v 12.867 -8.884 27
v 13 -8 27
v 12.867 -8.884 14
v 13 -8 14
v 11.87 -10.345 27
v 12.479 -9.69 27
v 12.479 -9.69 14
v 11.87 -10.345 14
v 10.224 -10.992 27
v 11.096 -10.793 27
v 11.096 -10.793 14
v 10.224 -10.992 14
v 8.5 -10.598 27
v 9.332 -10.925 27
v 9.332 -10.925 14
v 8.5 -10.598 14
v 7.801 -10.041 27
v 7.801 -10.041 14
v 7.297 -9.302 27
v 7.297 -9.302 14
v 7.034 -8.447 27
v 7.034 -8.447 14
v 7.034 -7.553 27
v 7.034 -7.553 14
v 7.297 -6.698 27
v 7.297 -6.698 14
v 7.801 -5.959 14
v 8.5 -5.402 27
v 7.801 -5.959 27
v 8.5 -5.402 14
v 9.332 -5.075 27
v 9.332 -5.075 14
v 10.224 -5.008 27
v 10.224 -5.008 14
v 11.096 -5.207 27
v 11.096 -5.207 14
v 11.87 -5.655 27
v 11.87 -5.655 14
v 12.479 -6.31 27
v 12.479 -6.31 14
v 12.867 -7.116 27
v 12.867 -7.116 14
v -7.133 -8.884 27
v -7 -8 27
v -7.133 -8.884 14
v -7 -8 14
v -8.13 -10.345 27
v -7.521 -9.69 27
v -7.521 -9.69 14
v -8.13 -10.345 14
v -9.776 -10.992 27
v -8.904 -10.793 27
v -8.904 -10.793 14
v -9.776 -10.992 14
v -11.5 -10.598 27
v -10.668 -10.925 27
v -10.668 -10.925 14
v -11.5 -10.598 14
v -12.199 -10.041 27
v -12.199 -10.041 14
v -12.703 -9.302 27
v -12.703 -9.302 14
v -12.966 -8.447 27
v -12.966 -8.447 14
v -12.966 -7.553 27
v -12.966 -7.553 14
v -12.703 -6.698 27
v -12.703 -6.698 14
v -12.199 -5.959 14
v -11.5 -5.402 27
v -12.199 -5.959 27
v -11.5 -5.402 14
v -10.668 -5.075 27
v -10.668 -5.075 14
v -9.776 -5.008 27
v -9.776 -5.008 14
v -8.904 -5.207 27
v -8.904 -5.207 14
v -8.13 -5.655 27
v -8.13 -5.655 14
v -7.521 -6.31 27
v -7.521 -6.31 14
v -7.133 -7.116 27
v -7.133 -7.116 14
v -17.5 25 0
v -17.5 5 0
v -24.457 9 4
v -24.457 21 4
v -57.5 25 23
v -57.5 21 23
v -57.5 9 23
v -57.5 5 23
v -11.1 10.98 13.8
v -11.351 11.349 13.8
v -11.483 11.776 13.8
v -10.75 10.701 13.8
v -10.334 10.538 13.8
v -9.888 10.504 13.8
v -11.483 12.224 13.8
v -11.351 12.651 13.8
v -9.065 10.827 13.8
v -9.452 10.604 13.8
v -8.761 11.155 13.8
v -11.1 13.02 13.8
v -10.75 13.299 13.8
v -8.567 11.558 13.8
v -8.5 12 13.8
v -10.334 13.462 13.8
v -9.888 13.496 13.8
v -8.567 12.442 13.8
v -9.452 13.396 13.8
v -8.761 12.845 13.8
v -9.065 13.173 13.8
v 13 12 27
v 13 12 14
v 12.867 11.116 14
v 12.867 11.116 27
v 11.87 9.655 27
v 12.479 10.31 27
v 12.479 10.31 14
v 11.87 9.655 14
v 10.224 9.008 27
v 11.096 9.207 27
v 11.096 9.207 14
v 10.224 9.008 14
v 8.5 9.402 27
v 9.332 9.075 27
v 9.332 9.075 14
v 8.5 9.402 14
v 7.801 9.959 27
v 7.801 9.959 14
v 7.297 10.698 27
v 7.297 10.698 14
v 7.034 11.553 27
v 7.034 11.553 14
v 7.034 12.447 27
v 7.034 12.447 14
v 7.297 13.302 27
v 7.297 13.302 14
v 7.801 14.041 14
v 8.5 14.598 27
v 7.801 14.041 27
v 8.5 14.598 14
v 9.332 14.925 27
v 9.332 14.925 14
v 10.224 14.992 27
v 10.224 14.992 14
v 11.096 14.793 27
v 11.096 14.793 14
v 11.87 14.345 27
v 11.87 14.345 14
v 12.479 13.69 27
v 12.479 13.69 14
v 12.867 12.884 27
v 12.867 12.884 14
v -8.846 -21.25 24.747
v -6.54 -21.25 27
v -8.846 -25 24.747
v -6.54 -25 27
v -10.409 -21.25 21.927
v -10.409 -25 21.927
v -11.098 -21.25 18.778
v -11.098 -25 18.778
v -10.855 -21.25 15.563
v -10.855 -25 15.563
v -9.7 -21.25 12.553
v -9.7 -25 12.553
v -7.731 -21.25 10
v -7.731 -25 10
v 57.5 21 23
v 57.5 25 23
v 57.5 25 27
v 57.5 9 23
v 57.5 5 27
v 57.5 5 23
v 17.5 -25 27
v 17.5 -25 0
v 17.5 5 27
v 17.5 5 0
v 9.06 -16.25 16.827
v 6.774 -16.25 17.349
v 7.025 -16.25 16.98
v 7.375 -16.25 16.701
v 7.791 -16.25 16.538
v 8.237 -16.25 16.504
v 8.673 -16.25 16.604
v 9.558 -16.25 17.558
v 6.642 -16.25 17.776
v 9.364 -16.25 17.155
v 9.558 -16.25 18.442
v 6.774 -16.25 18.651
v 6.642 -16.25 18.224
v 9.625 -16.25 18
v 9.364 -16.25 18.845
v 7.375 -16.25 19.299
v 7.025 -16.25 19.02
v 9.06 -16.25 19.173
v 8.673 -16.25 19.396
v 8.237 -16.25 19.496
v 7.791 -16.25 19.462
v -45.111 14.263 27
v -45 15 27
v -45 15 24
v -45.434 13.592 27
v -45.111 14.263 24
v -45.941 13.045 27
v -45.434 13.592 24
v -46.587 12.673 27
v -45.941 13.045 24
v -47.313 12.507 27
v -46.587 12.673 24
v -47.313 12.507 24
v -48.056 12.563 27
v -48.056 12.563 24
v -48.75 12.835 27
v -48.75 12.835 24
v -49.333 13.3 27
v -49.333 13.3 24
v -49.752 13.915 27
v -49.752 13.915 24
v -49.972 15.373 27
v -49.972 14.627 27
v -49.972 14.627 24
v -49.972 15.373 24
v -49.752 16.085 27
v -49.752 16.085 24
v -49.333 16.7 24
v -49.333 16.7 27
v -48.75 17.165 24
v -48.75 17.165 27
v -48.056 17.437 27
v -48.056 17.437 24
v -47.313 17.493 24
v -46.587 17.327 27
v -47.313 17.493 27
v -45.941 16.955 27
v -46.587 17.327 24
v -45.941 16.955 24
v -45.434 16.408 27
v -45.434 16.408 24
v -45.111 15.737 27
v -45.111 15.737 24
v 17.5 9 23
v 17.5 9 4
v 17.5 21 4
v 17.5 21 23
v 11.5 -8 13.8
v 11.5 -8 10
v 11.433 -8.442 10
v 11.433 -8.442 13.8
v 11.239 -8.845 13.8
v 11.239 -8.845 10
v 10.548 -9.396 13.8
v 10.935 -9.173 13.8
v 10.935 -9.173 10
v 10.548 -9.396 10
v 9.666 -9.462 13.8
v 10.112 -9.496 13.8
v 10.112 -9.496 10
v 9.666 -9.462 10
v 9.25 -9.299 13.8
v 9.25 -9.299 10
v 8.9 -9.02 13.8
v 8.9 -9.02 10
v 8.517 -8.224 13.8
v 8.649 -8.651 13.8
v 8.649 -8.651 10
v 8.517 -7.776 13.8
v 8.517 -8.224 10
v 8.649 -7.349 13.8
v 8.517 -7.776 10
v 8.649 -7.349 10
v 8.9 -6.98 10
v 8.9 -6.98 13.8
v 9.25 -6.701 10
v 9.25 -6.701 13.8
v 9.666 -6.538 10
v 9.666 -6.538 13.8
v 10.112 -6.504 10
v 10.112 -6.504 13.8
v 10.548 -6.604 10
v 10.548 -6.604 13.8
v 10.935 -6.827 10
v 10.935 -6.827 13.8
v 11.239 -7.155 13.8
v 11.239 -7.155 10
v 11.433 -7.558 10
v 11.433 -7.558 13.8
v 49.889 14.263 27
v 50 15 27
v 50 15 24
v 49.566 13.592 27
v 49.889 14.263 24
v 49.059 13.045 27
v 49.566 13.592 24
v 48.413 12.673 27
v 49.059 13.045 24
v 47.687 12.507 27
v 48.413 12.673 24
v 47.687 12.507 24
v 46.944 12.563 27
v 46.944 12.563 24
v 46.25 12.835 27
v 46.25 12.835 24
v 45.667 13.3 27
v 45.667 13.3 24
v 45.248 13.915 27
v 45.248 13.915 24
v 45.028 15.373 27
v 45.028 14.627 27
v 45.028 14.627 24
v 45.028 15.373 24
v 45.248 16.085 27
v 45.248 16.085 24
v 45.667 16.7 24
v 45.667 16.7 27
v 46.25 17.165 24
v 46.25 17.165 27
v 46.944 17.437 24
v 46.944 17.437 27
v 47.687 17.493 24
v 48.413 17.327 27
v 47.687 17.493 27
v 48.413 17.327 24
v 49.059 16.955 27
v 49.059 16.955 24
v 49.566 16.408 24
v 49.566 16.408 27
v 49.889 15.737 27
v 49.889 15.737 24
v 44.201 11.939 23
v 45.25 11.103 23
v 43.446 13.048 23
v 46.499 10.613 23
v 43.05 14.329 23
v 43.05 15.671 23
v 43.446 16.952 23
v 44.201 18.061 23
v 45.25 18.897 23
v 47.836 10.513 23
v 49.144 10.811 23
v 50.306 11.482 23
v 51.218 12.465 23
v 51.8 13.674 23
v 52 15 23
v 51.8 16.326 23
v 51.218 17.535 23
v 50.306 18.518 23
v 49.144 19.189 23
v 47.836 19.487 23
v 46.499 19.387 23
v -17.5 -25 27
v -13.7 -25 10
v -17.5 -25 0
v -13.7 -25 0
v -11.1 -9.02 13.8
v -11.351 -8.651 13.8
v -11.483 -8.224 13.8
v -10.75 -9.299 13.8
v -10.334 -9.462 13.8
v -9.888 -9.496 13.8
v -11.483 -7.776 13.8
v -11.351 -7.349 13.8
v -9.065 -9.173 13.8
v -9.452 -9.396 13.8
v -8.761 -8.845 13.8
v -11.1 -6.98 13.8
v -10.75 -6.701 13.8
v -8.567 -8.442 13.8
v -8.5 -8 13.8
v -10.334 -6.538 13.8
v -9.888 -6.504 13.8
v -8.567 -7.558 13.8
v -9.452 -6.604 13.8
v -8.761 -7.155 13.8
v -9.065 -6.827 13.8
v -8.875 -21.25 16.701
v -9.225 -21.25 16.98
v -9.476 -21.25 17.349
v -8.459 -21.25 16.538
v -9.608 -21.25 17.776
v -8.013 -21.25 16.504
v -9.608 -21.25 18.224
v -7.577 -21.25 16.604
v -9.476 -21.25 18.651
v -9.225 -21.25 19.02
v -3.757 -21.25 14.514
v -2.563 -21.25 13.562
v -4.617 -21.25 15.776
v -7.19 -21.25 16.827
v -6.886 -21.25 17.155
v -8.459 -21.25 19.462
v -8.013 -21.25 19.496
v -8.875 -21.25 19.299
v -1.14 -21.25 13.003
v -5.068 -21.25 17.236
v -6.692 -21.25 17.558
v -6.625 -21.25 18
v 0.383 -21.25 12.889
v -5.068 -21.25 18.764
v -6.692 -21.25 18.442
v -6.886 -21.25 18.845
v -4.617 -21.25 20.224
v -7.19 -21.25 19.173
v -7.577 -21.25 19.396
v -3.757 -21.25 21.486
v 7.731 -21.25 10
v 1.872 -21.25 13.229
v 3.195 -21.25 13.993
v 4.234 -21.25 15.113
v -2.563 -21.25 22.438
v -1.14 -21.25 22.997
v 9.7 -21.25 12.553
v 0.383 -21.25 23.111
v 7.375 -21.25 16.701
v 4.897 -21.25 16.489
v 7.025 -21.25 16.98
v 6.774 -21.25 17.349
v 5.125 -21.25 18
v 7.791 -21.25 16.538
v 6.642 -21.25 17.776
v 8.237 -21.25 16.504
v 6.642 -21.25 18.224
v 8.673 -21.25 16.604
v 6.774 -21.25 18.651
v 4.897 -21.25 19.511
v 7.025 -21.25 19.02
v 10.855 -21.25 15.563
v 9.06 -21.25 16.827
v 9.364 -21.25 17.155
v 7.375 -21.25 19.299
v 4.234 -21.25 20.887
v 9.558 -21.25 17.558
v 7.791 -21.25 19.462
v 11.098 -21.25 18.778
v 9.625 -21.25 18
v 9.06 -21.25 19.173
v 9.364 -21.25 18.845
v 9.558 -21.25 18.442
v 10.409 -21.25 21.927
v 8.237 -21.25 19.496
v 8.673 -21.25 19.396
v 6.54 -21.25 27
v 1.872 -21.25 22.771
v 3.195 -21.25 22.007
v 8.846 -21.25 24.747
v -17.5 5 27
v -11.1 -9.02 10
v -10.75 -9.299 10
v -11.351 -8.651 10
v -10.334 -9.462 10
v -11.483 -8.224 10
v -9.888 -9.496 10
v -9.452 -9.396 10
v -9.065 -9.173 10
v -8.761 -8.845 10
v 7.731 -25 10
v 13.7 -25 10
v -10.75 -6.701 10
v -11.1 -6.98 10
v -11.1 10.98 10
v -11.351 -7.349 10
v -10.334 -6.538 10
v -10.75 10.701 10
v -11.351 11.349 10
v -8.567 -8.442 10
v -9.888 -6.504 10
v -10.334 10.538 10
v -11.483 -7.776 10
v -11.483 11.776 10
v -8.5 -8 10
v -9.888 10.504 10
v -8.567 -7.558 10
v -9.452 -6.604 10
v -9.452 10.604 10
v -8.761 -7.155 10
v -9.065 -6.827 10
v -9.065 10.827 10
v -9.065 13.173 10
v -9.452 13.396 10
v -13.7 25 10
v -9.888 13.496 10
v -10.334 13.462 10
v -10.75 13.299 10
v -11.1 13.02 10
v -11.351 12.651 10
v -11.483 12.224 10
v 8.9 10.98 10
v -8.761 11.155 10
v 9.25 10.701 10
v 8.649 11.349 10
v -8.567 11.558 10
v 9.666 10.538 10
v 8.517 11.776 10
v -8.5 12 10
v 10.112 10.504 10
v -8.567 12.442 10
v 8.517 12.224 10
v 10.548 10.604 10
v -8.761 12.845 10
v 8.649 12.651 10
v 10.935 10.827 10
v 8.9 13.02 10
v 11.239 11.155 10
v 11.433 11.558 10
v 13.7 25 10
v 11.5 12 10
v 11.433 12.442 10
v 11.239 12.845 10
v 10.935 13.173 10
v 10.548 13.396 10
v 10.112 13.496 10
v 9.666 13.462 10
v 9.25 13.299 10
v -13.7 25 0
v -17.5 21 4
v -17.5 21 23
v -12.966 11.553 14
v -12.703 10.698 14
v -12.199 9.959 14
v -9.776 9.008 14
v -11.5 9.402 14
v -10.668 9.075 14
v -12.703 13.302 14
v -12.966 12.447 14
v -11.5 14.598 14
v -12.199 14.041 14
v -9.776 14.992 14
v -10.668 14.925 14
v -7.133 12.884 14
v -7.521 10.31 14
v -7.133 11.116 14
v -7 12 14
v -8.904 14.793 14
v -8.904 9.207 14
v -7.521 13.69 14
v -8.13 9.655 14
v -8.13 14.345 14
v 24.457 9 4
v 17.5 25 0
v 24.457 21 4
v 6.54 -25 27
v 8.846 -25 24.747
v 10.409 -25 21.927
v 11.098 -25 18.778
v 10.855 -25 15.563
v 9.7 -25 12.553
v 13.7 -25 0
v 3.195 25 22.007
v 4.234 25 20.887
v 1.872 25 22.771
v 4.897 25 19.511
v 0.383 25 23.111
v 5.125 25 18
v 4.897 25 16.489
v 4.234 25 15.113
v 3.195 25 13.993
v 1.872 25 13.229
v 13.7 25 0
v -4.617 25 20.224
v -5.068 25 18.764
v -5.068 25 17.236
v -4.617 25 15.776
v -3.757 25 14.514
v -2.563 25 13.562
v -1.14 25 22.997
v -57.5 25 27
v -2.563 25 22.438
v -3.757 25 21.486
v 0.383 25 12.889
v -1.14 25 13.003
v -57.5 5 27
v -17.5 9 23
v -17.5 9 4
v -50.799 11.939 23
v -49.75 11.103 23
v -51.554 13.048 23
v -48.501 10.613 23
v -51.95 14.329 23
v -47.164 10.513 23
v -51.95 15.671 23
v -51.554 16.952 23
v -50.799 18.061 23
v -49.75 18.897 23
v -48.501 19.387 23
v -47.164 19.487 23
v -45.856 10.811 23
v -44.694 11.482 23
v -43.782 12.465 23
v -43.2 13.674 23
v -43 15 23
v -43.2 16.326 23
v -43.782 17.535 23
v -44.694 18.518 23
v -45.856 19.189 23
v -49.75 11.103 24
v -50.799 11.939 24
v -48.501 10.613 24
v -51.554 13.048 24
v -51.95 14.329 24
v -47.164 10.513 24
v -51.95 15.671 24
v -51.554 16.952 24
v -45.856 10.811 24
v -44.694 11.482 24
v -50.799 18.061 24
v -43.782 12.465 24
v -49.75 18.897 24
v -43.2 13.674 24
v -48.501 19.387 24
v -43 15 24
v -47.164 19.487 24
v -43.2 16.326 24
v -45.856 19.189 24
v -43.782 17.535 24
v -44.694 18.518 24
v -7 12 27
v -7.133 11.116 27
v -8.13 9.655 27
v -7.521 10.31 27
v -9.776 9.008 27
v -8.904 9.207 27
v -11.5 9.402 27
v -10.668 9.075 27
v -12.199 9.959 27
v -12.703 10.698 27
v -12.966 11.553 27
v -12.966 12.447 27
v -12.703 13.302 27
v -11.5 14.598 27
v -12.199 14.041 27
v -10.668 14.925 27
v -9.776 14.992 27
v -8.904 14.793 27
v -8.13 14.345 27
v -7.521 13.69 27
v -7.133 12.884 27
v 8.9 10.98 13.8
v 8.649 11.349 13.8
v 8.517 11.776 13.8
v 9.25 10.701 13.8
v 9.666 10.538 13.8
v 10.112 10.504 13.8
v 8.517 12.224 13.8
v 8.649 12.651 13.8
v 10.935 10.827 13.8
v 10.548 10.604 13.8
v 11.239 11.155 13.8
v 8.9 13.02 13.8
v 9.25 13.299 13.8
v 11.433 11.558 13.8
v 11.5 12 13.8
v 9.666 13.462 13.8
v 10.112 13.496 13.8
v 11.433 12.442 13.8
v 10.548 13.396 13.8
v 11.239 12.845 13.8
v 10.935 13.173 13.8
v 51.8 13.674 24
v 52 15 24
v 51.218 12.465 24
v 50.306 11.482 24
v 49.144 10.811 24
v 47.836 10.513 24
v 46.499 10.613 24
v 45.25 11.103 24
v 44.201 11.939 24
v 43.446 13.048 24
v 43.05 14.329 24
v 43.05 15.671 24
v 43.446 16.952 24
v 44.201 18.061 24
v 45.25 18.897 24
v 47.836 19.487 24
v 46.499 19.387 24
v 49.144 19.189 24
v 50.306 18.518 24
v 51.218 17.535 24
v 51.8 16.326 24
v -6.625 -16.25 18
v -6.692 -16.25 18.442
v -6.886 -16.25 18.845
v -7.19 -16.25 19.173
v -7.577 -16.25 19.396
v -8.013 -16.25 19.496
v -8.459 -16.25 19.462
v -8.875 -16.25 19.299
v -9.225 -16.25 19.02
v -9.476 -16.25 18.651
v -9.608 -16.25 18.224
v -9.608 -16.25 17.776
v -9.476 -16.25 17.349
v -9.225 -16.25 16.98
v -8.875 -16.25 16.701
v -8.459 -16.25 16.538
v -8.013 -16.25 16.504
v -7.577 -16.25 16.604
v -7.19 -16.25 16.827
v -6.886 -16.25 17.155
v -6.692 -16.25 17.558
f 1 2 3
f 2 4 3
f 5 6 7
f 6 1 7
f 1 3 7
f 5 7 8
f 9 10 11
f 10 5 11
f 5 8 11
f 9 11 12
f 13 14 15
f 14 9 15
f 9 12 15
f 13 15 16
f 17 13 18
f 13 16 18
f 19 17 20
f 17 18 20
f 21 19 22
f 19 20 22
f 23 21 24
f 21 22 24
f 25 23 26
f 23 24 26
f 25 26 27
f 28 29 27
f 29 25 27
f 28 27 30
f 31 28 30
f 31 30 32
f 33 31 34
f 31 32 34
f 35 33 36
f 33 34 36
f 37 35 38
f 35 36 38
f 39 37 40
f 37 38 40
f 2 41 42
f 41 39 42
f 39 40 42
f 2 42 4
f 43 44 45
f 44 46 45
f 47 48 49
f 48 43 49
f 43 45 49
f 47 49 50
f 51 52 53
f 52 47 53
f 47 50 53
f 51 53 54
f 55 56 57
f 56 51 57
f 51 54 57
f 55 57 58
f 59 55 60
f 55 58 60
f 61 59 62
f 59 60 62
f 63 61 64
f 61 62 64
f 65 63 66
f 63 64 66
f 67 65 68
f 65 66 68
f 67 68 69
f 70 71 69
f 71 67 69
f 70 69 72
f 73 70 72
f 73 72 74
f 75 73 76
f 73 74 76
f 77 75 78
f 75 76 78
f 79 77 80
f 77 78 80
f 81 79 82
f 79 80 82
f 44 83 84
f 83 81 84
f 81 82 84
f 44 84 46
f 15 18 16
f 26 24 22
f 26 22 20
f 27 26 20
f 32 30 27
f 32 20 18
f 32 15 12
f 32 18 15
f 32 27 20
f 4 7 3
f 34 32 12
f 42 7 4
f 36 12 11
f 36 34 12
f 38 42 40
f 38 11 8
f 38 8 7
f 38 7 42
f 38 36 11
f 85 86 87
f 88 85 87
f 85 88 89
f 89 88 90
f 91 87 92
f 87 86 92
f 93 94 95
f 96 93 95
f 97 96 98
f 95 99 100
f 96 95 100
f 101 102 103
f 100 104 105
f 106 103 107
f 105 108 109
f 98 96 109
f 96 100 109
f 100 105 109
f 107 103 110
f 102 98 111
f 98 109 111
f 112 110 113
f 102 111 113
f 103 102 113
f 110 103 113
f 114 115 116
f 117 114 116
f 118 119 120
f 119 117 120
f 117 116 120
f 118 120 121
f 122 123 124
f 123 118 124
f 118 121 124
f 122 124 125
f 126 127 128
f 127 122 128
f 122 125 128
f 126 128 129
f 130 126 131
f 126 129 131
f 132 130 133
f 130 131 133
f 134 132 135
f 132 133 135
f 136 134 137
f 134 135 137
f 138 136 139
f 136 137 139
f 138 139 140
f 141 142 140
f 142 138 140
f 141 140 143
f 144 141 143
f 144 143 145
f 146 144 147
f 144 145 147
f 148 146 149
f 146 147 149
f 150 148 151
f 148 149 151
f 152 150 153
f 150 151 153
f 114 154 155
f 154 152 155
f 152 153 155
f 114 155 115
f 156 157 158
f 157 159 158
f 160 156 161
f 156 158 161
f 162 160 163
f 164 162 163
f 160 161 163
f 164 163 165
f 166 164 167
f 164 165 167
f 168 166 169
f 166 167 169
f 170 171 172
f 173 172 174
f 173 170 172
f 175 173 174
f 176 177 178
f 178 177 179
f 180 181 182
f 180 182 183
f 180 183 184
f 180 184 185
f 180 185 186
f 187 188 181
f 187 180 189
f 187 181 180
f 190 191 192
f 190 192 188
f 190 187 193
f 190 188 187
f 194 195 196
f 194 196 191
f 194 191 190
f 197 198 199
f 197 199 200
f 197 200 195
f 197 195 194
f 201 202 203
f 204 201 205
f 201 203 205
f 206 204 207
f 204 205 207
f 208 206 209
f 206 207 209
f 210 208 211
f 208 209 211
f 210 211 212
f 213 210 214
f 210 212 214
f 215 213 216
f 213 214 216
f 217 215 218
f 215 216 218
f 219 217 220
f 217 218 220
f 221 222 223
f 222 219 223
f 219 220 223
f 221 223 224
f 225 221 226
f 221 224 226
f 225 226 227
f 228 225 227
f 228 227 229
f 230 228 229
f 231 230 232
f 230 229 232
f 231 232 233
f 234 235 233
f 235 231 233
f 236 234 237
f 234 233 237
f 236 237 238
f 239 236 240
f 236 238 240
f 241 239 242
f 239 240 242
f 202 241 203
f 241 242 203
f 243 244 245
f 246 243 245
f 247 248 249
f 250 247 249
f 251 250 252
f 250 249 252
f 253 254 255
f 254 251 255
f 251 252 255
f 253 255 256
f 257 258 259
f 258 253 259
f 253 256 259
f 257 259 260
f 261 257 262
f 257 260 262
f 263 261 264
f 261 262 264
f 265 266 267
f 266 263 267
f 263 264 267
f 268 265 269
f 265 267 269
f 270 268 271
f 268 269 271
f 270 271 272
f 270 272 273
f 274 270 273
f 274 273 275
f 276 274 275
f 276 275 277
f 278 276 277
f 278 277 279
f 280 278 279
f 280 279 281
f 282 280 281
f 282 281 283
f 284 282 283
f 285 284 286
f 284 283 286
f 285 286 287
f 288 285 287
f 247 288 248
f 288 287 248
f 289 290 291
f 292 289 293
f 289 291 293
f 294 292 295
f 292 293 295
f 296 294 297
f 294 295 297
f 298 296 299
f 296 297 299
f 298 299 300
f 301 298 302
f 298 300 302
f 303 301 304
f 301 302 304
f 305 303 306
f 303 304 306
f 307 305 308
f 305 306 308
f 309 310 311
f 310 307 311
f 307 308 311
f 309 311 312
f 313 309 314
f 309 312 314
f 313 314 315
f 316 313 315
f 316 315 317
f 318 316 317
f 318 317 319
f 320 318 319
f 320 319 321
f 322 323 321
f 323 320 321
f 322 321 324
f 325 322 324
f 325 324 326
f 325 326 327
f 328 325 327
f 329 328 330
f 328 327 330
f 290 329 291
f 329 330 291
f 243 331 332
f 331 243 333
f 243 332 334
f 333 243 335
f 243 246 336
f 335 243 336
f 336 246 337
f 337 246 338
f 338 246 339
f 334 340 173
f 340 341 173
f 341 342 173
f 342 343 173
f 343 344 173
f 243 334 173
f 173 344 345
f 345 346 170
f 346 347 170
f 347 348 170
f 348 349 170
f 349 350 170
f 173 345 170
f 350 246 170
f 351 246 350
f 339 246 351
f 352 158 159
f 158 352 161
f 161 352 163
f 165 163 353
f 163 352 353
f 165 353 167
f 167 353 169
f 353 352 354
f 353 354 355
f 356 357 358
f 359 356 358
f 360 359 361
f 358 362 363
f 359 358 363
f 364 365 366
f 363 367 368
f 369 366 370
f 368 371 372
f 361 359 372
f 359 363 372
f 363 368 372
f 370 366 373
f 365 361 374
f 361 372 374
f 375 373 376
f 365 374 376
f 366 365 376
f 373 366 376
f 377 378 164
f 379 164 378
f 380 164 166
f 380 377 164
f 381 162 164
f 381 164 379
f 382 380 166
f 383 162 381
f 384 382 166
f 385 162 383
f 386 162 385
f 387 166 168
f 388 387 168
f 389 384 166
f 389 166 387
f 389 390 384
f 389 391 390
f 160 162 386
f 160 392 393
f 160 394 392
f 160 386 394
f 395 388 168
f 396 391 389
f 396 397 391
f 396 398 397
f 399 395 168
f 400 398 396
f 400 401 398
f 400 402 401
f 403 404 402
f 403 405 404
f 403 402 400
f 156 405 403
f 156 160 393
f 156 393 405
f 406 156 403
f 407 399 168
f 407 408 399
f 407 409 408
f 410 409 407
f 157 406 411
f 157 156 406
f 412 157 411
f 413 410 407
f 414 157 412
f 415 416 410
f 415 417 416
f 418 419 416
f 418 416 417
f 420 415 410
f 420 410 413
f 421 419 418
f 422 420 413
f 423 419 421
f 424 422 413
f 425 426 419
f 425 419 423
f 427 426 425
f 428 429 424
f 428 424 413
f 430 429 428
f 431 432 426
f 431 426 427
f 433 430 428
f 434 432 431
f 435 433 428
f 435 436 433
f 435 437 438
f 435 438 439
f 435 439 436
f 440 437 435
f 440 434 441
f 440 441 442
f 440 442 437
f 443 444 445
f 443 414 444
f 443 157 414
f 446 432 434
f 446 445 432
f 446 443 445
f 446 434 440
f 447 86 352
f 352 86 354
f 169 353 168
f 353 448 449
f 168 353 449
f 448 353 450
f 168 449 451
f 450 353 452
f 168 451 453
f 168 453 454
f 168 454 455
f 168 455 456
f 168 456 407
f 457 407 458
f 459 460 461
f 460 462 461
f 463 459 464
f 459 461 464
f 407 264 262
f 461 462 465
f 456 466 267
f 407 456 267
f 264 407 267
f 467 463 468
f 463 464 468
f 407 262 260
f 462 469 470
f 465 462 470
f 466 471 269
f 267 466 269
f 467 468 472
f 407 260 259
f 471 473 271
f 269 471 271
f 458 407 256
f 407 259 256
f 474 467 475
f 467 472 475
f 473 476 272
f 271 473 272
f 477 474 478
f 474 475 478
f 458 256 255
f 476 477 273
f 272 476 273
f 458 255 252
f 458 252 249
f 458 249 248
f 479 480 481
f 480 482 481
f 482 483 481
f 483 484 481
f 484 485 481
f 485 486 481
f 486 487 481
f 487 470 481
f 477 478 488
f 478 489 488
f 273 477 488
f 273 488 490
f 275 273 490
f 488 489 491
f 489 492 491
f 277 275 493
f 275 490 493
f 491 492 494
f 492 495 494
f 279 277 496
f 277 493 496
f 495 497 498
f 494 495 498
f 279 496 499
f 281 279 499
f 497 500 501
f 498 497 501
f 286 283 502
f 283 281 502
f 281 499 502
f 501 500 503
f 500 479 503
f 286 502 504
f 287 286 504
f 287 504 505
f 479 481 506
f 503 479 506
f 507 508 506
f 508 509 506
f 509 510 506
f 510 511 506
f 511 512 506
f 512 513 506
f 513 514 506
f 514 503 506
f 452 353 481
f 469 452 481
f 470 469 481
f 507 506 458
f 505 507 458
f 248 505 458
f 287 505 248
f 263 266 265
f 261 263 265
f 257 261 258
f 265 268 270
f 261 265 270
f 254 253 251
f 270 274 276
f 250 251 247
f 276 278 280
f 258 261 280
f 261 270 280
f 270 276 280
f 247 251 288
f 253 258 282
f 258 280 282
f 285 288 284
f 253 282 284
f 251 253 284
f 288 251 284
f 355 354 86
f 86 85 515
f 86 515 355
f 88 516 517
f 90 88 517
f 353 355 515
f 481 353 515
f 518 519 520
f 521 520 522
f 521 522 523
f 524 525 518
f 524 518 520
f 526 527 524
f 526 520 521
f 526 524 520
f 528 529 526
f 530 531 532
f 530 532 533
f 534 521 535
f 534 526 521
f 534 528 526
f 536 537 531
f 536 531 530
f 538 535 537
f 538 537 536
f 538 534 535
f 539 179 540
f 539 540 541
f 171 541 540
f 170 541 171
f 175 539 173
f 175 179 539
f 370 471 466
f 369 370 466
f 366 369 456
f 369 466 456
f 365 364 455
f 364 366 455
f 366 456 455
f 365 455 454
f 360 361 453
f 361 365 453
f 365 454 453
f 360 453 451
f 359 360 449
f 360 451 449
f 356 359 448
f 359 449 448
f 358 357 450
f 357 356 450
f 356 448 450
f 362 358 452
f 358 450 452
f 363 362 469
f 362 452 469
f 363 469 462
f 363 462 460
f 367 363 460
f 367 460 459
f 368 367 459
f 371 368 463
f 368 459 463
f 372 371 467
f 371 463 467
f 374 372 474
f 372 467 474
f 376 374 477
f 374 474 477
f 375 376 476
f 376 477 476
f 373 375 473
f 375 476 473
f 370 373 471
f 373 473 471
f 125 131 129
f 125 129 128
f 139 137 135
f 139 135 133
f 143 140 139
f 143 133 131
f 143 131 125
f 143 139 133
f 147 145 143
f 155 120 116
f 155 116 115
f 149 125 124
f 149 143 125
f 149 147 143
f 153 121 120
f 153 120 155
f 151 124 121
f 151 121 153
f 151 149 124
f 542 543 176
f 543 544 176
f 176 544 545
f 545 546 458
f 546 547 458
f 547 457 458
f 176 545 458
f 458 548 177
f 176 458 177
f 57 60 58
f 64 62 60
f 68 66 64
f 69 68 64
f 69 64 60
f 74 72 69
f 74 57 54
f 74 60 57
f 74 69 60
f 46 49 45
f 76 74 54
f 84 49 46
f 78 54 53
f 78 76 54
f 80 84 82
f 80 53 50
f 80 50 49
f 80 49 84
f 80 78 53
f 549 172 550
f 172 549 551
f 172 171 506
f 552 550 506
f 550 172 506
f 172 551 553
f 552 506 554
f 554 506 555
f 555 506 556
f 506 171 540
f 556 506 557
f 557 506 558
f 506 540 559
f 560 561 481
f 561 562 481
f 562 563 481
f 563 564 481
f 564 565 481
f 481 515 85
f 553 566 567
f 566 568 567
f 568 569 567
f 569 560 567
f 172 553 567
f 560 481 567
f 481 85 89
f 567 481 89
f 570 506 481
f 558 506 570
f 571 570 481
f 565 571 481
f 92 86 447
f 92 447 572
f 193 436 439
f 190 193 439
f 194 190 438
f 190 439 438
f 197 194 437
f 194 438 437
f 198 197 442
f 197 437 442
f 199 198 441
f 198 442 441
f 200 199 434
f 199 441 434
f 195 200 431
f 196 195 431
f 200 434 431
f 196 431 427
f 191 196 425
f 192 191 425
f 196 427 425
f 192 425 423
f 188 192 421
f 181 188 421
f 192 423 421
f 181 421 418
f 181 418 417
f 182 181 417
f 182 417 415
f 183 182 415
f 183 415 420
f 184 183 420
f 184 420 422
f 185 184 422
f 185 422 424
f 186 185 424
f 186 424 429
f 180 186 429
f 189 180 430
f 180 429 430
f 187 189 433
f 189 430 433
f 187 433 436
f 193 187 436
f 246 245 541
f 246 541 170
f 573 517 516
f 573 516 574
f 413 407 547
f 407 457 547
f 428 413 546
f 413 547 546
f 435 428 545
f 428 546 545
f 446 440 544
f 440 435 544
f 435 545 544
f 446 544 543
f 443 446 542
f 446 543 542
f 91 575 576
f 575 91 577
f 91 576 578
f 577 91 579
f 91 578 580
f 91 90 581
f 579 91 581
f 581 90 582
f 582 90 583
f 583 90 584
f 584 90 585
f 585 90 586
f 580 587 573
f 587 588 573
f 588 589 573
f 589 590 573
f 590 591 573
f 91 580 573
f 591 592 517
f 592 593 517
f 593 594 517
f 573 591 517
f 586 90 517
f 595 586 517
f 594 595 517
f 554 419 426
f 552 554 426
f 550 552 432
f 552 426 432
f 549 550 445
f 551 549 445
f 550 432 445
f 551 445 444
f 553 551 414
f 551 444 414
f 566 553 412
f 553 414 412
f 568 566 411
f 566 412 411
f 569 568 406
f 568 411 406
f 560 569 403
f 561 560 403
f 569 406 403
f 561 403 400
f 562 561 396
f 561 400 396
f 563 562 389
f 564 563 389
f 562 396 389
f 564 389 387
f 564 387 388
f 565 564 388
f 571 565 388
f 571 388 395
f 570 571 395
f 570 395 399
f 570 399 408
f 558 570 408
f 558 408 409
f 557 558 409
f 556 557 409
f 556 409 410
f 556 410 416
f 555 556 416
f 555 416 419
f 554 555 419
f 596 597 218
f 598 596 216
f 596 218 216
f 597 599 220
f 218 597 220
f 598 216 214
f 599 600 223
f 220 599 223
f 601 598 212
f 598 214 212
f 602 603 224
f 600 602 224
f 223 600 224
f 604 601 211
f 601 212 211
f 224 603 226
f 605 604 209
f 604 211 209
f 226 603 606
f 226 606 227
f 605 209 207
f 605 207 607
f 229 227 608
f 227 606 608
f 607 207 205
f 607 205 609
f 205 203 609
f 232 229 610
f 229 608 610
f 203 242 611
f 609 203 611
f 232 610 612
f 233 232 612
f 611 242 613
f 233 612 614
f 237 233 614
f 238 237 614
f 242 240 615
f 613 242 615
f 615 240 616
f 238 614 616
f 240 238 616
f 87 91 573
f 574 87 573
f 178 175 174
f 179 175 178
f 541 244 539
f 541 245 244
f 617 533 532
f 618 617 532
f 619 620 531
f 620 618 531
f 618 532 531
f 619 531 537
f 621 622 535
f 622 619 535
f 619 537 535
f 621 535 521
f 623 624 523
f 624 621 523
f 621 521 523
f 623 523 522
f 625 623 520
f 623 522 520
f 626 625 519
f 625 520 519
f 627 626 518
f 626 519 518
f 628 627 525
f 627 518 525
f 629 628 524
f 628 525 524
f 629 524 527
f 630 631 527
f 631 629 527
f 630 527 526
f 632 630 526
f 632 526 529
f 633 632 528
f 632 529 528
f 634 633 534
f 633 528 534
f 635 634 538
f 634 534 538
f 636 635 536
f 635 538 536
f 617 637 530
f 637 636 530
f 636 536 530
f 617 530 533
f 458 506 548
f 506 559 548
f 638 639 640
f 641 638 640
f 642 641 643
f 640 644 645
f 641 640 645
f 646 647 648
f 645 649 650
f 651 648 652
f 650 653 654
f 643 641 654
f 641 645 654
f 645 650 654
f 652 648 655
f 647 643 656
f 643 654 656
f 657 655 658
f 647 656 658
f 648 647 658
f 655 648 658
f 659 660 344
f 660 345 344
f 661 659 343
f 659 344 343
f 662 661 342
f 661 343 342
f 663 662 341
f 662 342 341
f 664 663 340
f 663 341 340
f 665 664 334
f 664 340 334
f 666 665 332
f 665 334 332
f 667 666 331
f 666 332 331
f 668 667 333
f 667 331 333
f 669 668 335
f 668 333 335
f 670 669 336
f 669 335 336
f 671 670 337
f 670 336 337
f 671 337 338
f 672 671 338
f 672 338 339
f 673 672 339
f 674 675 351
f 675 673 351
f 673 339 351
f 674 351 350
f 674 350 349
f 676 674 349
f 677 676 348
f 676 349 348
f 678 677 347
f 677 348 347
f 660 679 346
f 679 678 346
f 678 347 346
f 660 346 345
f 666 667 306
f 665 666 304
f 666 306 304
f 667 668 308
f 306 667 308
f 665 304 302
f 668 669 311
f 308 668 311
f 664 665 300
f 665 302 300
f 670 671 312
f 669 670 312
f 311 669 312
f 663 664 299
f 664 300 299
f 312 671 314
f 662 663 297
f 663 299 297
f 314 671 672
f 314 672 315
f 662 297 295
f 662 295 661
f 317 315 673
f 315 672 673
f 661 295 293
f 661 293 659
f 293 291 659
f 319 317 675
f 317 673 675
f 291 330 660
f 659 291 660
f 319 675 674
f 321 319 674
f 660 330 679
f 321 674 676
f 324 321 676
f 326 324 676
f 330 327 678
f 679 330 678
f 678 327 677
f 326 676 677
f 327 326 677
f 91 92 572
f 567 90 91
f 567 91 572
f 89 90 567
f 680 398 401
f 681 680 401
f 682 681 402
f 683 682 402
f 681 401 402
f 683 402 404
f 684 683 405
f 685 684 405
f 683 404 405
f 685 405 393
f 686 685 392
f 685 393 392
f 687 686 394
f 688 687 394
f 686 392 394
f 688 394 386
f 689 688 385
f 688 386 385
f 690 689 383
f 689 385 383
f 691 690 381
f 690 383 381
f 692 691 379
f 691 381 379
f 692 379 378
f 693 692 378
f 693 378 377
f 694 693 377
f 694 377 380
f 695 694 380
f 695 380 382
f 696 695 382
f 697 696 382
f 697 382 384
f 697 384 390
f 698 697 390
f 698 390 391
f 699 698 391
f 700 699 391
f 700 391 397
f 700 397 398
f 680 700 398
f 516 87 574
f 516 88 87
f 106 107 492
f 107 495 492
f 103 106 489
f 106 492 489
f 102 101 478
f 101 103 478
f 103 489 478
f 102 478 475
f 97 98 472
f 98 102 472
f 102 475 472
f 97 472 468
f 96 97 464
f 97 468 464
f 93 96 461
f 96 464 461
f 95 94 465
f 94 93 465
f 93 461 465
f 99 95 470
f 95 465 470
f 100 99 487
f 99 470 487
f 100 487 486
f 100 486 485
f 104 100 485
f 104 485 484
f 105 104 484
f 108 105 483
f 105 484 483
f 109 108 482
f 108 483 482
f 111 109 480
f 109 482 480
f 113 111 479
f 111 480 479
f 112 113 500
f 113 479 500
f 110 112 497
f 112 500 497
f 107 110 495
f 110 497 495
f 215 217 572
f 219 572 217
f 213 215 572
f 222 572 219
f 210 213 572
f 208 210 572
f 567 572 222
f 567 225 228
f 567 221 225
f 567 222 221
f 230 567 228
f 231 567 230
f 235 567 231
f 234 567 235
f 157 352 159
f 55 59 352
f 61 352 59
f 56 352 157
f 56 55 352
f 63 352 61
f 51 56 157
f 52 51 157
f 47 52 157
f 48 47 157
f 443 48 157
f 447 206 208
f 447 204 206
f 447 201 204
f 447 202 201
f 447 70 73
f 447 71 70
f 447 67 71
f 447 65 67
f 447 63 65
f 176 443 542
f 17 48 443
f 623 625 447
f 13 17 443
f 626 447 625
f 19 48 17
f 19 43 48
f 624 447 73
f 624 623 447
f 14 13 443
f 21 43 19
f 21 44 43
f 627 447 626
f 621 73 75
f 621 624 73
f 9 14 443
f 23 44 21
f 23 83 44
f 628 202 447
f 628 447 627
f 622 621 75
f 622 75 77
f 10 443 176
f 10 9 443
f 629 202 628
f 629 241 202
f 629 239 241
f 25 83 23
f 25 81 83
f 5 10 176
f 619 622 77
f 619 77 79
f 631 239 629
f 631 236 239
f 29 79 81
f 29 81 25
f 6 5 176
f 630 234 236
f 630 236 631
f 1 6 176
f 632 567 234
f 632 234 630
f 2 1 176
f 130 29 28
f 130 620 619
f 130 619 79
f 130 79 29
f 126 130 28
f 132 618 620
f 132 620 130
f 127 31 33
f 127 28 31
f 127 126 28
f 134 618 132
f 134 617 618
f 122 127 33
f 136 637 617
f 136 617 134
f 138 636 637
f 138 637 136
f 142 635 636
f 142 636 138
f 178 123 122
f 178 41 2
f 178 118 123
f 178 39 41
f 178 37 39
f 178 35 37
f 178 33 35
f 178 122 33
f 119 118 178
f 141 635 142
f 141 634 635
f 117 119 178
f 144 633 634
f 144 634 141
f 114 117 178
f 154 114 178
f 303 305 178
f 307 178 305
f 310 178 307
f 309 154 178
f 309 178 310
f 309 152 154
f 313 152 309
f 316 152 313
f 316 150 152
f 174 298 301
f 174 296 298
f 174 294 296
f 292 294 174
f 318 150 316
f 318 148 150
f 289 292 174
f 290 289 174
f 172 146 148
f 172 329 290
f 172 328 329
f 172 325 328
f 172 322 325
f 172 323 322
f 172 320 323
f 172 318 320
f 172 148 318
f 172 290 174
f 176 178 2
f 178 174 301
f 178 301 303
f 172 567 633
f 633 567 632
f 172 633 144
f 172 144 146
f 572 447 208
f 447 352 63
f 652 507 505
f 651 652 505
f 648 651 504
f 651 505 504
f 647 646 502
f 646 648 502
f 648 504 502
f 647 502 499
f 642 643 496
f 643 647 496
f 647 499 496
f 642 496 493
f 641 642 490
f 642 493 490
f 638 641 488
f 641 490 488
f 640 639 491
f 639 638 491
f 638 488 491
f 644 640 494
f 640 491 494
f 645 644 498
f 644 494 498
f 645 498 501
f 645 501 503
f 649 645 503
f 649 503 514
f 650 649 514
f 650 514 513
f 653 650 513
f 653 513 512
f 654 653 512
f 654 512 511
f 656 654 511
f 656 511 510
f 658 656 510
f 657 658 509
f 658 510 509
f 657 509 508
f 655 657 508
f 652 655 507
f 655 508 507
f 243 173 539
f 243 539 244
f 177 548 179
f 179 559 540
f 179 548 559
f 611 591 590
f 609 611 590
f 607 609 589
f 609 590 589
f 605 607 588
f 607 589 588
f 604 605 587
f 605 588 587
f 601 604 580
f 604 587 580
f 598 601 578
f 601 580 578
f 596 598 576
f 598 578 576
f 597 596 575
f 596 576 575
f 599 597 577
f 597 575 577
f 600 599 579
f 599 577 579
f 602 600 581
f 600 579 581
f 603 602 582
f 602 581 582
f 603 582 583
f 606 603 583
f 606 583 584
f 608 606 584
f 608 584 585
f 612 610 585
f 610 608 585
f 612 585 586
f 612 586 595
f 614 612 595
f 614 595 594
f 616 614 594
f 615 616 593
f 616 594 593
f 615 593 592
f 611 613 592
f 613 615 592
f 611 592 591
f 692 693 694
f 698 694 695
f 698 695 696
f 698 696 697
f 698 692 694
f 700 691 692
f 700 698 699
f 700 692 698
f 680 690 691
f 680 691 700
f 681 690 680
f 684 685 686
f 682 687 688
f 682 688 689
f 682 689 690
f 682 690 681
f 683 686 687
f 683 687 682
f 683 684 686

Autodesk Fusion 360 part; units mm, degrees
sketch "Sketch1" plane through (0, 0, 0) normal (0, 0, 1) x (1, 0, 0)
  line L0 (17.5, 25) -> (-17.5, 25)
  line L1 (-17.5, 25) -> (-17.5, -25)
  line L2 (-17.5, -25) -> (17.5, -25)
  line L3 (17.5, -25) -> (17.5, 25)
  line L4 (17.5, 25) -> (-17.5, -25) construction
  line L5 (-17.5, 25) -> (17.5, -25) construction
  line L6 (-13.7, 25) -> (13.7, 25)
  line L7 (13.7, 25) -> (13.7, -25)
  line L8 (13.7, -25) -> (-13.7, -25)
  line L9 (-13.7, -25) -> (-13.7, 25)
  line L10 (-57.5, 25) -> (57.5, 25)
  line L11 (57.5, 25) -> (57.5, 5)
  line L12 (57.5, 5) -> (-57.5, 5)
  line L13 (-57.5, 5) -> (-57.5, 25)
  line L14 (17.5, -8) -> (-17.5, -8) construction
  line L15 (17.5, 12) -> (-17.5, 12) construction
  line L16 (-10, -25) -> (-10, 25) construction
  line L17 (10, -25) -> (10, 26.6131) construction
  circle A0 centre (10, -8) radius 1.5
  circle A1 centre (10, 12) radius 1.5
  circle A2 centre (-10, 12) radius 1.5
  circle A3 centre (-10, -8) radius 1.5
  circle A4 centre (10, 12) radius 3
  circle A5 centre (-10, 12) radius 3
  circle A6 centre (-10, -8) radius 3
  circle A7 centre (10, -8) radius 3
  circle A8 centre (47.5, 15) radius 2.5
  circle A9 centre (47.5, 15) radius 4.5
  circle A10 centre (-47.5, 15) radius 2.5
  circle A11 centre (-47.5, 15) radius 4.5
  line L18 (-17.5, 21) -> (-57.5, 21)
  line L19 (-57.5, 21) -> (-57.5, 9)
  line L20 (-57.5, 9) -> (-17.5, 9)
  line L21 (-17.5, 9) -> (-17.5, 21)
  line L22 (57.5, 9) -> (17.5, 9)
  line L23 (17.5, 9) -> (17.5, 21)
  line L24 (17.5, 21) -> (57.5, 21)
  line L25 (57.5, 21) -> (57.5, 9)
  point P0 (-47.5, 15)
  point P1 (47.5, 15)
  dimension "d1" = 35
  dimension "d2" = 50
  dimension "d5" = 27.4
  dimension "d6" = 50
  dimension "d7" = 3.8
  dimension "d10" = 115
  dimension "d11" = 20
  dimension "d12" = 40
  dimension "d16" = 7.5
  dimension "d17" = 7.5
  dimension "d19" = 13
  dimension "d20" = 3
  dimension "d21" = 3
  dimension "d22" = 3
  dimension "d23" = 3
  dimension "d30" = 6
  dimension "d31" = 6
  dimension "d32" = 6
  dimension "d33" = 6
  dimension "d40" = 5
  dimension "d41" = 9
  dimension "d42" = 5
  dimension "d43" = 9
  dimension "d52" = 40
  dimension "d53" = 12
  dimension "d54" = 12
  dimension "d71" = 20
  dimension "d81" = 10
  dimension "d82" = 10
  dimension "d83" = 10
  dimension "d84" = 10
extrude "Extrude1" add sketch "Sketch1" along normal blind 27 contours L0 L3 L7 L10 L12 L23 | L0 L6 L7 L9 L10 L12 | L0 L1 L9 L10 L12 L21 | L2 L3 L7 L12 | L2 L7 L8 L9 L12 | L1 L2 L9 L12 | A0 | A1 | A2 | A3 | A4 | A5 | A6 | A7
extrude "Extrude2" cut sketch "Sketch1" along normal blind 10 contours L0 L6 L7 L9 L10 L12 | L2 L7 L8 L9 L12 | A0 | A1 | A2 | A3 | A4 | A5 | A6 | A7
extrude "Extrude3" add sketch "Sketch1" along normal blind 4 from surface at 23 contours L0 L3 L7 L10 L12 L23 | L3 L10 L11 L24 | L0 L6 L7 L9 L10 L12 | L3 L11 L22 L23 L24 L25 | L0 L1 L9 L10 L12 L21 | L3 L11 L12 L22 | L1 L10 L13 L18 | L1 L13 L18 L19 L20 L21 | L1 L12 L13 L20 | A1 | A2 | A4 | A5 | A8 | A9 | A10 | A11
extrude "Extrude6" cut sketch "Sketch1" along normal up to surface (13 mm away) from surface at 14 contours A0 | A3 | A6 | A7
extrude "Extrude7" cut sketch "Sketch1" along normal up to surface (13 mm away) from surface at 14 contours A1 | A2 | A4 | A5
extrude "Extrude4" cut sketch "Sketch1" along normal blind 3.8 from surface at 10 contours A0 | A3
extrude "Extrude5" cut sketch "Sketch1" along normal blind 3.8 from surface at 10 contours A1 | A2
extrude "Extrude8" cut sketch "Sketch1" along normal up to surface (4 mm away) from surface at 23 contours A8 | A10
extrude "Extrude9" cut sketch "Sketch1" along normal blind 1 from surface at 23 contours A8 | A9 | A10 | A11
extrude "Extrude10" add sketch "Sketch1" along normal up to surface (23 mm away) contours L3 L10 L11 L24 | L3 L11 L22 L23 L24 L25 | L3 L11 L12 L22 | L1 L10 L13 L18 | L1 L13 L18 L19 L20 L21 | L1 L12 L13 L20
sketch "Sketch2" plane through (0, -25, 0) normal (0, -1, 0) x (1, 0, 0)
  line L0 (-17.5, 0) -> (-17.5, 23)
  line L1 (17.5, 23) -> (17.5, 0)
  line L2 (-13.7, 0) -> (-13.7, 10)
  line L3 (-13.7, 10) -> (13.7, 10)
  line L4 (13.7, 10) -> (13.7, 0)
  line L5 (13.7, 0) -> (17.5, 0)
  line L6 (17.5, 0) -> (17.5, 27)
  line L7 (17.5, 27) -> (-17.5, 27)
  line L8 (-17.5, 27) -> (-17.5, 0)
  line L9 (-17.5, 0) -> (-13.7, 0)
  line L10 (17.5, 18) -> (-17.5, 18) construction
  line L11 (0, 23) -> (0, 10) construction
  circle A0 centre (0, 18) radius 5.125
  circle A1 centre (0, 18) radius 11.125
  line L12 (11.125, 18) -> (5.125, 18)
  line L13 (11.125, 18) -> (5.125, 18) construction
  line L14 (-5.125, 18) -> (-11.125, 18) construction
  circle A2 centre (-8.125, 18) radius 1.5
  circle A3 centre (8.125, 18) radius 1.5
  line L15 (-17.5, 27) -> (-57.5, 27)
  line L16 (-57.5, 27) -> (-57.5, 0)
  line L17 (-57.5, 0) -> (-17.5, 0)
  line L18 (-17.5, 0) -> (-17.5, 27)
  line L19 (17.5, 27) -> (57.5, 27)
  line L20 (57.5, 27) -> (57.5, 0)
  line L21 (57.5, 0) -> (17.5, 0)
  line L22 (17.5, 0) -> (17.5, 27)
  line L23 (-57.5, 27) -> (-17.5, 0) construction
  line L24 (-17.5, 27) -> (-57.5, 0) construction
  line L25 (17.5, 0) -> (57.5, 27) construction
  line L26 (17.5, 27) -> (57.5, 0) construction
  line L27 (-17.5, 23) -> (-57.5, 23)
  line L28 (-57.5, 23) -> (-57.5, 4)
  line L29 (-57.5, 4) -> (-17.5, 4)
  line L30 (-17.5, 4) -> (-17.5, 23)
  line L31 (-17.5, 23) -> (-57.5, 4) construction
  line L32 (-57.5, 23) -> (-17.5, 4) construction
  line L33 (57.5, 23) -> (17.5, 23)
  line L34 (17.5, 23) -> (17.5, 4)
  line L35 (17.5, 4) -> (57.5, 4)
  line L36 (57.5, 4) -> (57.5, 23)
  line L37 (57.5, 23) -> (17.5, 4) construction
  line L38 (17.5, 23) -> (57.5, 4) construction
  line L39 (-17.5, 0) -> (-57.5, 23)
  line L40 (17.5, 0) -> (57.5, 23)
  point P0 (-37.5, 13.5)
  point P1 (37.5, 13.5)
  dimension "d64" = 8
  dimension "d65" = 10.25
  dimension "d66" = 22.25
  dimension "d74" = 3
  dimension "d75" = 3
  dimension "d85" = 40
  dimension "d86" = 27
  dimension "d87" = 40
  dimension "d88" = 27
  dimension "d89" = 19
  dimension "d90" = 40
  dimension "d91" = 19
extrude "Extrude16" cut sketch "Sketch2" against normal up to surface (50 mm away) contours L16 L17 L29 L39 | L16 L28 L29 L39 | L20 L21 L35 L40 | L20 L35 L36 L40
extrude "Extrude14" cut sketch "Sketch2" against normal blind 3.75 contours L3 L7 A1 | A0 | L12 A3 | L12 A3 | A2
extrude "Extrude13" cut sketch "Sketch2" against normal up to surface (50 mm away) contours A0
extrude "Extrude15" cut sketch "Sketch2" against normal blind 5 from surface at -3.75 contours L12 A3 | L12 A3 | A2
extrude "Extrude11" cut sketch "Sketch1" along normal up to surface (19 mm away) from surface at 4 contours L3 L11 L22 L23 L24 L25 | L1 L13 L18 L19 L20 L21
